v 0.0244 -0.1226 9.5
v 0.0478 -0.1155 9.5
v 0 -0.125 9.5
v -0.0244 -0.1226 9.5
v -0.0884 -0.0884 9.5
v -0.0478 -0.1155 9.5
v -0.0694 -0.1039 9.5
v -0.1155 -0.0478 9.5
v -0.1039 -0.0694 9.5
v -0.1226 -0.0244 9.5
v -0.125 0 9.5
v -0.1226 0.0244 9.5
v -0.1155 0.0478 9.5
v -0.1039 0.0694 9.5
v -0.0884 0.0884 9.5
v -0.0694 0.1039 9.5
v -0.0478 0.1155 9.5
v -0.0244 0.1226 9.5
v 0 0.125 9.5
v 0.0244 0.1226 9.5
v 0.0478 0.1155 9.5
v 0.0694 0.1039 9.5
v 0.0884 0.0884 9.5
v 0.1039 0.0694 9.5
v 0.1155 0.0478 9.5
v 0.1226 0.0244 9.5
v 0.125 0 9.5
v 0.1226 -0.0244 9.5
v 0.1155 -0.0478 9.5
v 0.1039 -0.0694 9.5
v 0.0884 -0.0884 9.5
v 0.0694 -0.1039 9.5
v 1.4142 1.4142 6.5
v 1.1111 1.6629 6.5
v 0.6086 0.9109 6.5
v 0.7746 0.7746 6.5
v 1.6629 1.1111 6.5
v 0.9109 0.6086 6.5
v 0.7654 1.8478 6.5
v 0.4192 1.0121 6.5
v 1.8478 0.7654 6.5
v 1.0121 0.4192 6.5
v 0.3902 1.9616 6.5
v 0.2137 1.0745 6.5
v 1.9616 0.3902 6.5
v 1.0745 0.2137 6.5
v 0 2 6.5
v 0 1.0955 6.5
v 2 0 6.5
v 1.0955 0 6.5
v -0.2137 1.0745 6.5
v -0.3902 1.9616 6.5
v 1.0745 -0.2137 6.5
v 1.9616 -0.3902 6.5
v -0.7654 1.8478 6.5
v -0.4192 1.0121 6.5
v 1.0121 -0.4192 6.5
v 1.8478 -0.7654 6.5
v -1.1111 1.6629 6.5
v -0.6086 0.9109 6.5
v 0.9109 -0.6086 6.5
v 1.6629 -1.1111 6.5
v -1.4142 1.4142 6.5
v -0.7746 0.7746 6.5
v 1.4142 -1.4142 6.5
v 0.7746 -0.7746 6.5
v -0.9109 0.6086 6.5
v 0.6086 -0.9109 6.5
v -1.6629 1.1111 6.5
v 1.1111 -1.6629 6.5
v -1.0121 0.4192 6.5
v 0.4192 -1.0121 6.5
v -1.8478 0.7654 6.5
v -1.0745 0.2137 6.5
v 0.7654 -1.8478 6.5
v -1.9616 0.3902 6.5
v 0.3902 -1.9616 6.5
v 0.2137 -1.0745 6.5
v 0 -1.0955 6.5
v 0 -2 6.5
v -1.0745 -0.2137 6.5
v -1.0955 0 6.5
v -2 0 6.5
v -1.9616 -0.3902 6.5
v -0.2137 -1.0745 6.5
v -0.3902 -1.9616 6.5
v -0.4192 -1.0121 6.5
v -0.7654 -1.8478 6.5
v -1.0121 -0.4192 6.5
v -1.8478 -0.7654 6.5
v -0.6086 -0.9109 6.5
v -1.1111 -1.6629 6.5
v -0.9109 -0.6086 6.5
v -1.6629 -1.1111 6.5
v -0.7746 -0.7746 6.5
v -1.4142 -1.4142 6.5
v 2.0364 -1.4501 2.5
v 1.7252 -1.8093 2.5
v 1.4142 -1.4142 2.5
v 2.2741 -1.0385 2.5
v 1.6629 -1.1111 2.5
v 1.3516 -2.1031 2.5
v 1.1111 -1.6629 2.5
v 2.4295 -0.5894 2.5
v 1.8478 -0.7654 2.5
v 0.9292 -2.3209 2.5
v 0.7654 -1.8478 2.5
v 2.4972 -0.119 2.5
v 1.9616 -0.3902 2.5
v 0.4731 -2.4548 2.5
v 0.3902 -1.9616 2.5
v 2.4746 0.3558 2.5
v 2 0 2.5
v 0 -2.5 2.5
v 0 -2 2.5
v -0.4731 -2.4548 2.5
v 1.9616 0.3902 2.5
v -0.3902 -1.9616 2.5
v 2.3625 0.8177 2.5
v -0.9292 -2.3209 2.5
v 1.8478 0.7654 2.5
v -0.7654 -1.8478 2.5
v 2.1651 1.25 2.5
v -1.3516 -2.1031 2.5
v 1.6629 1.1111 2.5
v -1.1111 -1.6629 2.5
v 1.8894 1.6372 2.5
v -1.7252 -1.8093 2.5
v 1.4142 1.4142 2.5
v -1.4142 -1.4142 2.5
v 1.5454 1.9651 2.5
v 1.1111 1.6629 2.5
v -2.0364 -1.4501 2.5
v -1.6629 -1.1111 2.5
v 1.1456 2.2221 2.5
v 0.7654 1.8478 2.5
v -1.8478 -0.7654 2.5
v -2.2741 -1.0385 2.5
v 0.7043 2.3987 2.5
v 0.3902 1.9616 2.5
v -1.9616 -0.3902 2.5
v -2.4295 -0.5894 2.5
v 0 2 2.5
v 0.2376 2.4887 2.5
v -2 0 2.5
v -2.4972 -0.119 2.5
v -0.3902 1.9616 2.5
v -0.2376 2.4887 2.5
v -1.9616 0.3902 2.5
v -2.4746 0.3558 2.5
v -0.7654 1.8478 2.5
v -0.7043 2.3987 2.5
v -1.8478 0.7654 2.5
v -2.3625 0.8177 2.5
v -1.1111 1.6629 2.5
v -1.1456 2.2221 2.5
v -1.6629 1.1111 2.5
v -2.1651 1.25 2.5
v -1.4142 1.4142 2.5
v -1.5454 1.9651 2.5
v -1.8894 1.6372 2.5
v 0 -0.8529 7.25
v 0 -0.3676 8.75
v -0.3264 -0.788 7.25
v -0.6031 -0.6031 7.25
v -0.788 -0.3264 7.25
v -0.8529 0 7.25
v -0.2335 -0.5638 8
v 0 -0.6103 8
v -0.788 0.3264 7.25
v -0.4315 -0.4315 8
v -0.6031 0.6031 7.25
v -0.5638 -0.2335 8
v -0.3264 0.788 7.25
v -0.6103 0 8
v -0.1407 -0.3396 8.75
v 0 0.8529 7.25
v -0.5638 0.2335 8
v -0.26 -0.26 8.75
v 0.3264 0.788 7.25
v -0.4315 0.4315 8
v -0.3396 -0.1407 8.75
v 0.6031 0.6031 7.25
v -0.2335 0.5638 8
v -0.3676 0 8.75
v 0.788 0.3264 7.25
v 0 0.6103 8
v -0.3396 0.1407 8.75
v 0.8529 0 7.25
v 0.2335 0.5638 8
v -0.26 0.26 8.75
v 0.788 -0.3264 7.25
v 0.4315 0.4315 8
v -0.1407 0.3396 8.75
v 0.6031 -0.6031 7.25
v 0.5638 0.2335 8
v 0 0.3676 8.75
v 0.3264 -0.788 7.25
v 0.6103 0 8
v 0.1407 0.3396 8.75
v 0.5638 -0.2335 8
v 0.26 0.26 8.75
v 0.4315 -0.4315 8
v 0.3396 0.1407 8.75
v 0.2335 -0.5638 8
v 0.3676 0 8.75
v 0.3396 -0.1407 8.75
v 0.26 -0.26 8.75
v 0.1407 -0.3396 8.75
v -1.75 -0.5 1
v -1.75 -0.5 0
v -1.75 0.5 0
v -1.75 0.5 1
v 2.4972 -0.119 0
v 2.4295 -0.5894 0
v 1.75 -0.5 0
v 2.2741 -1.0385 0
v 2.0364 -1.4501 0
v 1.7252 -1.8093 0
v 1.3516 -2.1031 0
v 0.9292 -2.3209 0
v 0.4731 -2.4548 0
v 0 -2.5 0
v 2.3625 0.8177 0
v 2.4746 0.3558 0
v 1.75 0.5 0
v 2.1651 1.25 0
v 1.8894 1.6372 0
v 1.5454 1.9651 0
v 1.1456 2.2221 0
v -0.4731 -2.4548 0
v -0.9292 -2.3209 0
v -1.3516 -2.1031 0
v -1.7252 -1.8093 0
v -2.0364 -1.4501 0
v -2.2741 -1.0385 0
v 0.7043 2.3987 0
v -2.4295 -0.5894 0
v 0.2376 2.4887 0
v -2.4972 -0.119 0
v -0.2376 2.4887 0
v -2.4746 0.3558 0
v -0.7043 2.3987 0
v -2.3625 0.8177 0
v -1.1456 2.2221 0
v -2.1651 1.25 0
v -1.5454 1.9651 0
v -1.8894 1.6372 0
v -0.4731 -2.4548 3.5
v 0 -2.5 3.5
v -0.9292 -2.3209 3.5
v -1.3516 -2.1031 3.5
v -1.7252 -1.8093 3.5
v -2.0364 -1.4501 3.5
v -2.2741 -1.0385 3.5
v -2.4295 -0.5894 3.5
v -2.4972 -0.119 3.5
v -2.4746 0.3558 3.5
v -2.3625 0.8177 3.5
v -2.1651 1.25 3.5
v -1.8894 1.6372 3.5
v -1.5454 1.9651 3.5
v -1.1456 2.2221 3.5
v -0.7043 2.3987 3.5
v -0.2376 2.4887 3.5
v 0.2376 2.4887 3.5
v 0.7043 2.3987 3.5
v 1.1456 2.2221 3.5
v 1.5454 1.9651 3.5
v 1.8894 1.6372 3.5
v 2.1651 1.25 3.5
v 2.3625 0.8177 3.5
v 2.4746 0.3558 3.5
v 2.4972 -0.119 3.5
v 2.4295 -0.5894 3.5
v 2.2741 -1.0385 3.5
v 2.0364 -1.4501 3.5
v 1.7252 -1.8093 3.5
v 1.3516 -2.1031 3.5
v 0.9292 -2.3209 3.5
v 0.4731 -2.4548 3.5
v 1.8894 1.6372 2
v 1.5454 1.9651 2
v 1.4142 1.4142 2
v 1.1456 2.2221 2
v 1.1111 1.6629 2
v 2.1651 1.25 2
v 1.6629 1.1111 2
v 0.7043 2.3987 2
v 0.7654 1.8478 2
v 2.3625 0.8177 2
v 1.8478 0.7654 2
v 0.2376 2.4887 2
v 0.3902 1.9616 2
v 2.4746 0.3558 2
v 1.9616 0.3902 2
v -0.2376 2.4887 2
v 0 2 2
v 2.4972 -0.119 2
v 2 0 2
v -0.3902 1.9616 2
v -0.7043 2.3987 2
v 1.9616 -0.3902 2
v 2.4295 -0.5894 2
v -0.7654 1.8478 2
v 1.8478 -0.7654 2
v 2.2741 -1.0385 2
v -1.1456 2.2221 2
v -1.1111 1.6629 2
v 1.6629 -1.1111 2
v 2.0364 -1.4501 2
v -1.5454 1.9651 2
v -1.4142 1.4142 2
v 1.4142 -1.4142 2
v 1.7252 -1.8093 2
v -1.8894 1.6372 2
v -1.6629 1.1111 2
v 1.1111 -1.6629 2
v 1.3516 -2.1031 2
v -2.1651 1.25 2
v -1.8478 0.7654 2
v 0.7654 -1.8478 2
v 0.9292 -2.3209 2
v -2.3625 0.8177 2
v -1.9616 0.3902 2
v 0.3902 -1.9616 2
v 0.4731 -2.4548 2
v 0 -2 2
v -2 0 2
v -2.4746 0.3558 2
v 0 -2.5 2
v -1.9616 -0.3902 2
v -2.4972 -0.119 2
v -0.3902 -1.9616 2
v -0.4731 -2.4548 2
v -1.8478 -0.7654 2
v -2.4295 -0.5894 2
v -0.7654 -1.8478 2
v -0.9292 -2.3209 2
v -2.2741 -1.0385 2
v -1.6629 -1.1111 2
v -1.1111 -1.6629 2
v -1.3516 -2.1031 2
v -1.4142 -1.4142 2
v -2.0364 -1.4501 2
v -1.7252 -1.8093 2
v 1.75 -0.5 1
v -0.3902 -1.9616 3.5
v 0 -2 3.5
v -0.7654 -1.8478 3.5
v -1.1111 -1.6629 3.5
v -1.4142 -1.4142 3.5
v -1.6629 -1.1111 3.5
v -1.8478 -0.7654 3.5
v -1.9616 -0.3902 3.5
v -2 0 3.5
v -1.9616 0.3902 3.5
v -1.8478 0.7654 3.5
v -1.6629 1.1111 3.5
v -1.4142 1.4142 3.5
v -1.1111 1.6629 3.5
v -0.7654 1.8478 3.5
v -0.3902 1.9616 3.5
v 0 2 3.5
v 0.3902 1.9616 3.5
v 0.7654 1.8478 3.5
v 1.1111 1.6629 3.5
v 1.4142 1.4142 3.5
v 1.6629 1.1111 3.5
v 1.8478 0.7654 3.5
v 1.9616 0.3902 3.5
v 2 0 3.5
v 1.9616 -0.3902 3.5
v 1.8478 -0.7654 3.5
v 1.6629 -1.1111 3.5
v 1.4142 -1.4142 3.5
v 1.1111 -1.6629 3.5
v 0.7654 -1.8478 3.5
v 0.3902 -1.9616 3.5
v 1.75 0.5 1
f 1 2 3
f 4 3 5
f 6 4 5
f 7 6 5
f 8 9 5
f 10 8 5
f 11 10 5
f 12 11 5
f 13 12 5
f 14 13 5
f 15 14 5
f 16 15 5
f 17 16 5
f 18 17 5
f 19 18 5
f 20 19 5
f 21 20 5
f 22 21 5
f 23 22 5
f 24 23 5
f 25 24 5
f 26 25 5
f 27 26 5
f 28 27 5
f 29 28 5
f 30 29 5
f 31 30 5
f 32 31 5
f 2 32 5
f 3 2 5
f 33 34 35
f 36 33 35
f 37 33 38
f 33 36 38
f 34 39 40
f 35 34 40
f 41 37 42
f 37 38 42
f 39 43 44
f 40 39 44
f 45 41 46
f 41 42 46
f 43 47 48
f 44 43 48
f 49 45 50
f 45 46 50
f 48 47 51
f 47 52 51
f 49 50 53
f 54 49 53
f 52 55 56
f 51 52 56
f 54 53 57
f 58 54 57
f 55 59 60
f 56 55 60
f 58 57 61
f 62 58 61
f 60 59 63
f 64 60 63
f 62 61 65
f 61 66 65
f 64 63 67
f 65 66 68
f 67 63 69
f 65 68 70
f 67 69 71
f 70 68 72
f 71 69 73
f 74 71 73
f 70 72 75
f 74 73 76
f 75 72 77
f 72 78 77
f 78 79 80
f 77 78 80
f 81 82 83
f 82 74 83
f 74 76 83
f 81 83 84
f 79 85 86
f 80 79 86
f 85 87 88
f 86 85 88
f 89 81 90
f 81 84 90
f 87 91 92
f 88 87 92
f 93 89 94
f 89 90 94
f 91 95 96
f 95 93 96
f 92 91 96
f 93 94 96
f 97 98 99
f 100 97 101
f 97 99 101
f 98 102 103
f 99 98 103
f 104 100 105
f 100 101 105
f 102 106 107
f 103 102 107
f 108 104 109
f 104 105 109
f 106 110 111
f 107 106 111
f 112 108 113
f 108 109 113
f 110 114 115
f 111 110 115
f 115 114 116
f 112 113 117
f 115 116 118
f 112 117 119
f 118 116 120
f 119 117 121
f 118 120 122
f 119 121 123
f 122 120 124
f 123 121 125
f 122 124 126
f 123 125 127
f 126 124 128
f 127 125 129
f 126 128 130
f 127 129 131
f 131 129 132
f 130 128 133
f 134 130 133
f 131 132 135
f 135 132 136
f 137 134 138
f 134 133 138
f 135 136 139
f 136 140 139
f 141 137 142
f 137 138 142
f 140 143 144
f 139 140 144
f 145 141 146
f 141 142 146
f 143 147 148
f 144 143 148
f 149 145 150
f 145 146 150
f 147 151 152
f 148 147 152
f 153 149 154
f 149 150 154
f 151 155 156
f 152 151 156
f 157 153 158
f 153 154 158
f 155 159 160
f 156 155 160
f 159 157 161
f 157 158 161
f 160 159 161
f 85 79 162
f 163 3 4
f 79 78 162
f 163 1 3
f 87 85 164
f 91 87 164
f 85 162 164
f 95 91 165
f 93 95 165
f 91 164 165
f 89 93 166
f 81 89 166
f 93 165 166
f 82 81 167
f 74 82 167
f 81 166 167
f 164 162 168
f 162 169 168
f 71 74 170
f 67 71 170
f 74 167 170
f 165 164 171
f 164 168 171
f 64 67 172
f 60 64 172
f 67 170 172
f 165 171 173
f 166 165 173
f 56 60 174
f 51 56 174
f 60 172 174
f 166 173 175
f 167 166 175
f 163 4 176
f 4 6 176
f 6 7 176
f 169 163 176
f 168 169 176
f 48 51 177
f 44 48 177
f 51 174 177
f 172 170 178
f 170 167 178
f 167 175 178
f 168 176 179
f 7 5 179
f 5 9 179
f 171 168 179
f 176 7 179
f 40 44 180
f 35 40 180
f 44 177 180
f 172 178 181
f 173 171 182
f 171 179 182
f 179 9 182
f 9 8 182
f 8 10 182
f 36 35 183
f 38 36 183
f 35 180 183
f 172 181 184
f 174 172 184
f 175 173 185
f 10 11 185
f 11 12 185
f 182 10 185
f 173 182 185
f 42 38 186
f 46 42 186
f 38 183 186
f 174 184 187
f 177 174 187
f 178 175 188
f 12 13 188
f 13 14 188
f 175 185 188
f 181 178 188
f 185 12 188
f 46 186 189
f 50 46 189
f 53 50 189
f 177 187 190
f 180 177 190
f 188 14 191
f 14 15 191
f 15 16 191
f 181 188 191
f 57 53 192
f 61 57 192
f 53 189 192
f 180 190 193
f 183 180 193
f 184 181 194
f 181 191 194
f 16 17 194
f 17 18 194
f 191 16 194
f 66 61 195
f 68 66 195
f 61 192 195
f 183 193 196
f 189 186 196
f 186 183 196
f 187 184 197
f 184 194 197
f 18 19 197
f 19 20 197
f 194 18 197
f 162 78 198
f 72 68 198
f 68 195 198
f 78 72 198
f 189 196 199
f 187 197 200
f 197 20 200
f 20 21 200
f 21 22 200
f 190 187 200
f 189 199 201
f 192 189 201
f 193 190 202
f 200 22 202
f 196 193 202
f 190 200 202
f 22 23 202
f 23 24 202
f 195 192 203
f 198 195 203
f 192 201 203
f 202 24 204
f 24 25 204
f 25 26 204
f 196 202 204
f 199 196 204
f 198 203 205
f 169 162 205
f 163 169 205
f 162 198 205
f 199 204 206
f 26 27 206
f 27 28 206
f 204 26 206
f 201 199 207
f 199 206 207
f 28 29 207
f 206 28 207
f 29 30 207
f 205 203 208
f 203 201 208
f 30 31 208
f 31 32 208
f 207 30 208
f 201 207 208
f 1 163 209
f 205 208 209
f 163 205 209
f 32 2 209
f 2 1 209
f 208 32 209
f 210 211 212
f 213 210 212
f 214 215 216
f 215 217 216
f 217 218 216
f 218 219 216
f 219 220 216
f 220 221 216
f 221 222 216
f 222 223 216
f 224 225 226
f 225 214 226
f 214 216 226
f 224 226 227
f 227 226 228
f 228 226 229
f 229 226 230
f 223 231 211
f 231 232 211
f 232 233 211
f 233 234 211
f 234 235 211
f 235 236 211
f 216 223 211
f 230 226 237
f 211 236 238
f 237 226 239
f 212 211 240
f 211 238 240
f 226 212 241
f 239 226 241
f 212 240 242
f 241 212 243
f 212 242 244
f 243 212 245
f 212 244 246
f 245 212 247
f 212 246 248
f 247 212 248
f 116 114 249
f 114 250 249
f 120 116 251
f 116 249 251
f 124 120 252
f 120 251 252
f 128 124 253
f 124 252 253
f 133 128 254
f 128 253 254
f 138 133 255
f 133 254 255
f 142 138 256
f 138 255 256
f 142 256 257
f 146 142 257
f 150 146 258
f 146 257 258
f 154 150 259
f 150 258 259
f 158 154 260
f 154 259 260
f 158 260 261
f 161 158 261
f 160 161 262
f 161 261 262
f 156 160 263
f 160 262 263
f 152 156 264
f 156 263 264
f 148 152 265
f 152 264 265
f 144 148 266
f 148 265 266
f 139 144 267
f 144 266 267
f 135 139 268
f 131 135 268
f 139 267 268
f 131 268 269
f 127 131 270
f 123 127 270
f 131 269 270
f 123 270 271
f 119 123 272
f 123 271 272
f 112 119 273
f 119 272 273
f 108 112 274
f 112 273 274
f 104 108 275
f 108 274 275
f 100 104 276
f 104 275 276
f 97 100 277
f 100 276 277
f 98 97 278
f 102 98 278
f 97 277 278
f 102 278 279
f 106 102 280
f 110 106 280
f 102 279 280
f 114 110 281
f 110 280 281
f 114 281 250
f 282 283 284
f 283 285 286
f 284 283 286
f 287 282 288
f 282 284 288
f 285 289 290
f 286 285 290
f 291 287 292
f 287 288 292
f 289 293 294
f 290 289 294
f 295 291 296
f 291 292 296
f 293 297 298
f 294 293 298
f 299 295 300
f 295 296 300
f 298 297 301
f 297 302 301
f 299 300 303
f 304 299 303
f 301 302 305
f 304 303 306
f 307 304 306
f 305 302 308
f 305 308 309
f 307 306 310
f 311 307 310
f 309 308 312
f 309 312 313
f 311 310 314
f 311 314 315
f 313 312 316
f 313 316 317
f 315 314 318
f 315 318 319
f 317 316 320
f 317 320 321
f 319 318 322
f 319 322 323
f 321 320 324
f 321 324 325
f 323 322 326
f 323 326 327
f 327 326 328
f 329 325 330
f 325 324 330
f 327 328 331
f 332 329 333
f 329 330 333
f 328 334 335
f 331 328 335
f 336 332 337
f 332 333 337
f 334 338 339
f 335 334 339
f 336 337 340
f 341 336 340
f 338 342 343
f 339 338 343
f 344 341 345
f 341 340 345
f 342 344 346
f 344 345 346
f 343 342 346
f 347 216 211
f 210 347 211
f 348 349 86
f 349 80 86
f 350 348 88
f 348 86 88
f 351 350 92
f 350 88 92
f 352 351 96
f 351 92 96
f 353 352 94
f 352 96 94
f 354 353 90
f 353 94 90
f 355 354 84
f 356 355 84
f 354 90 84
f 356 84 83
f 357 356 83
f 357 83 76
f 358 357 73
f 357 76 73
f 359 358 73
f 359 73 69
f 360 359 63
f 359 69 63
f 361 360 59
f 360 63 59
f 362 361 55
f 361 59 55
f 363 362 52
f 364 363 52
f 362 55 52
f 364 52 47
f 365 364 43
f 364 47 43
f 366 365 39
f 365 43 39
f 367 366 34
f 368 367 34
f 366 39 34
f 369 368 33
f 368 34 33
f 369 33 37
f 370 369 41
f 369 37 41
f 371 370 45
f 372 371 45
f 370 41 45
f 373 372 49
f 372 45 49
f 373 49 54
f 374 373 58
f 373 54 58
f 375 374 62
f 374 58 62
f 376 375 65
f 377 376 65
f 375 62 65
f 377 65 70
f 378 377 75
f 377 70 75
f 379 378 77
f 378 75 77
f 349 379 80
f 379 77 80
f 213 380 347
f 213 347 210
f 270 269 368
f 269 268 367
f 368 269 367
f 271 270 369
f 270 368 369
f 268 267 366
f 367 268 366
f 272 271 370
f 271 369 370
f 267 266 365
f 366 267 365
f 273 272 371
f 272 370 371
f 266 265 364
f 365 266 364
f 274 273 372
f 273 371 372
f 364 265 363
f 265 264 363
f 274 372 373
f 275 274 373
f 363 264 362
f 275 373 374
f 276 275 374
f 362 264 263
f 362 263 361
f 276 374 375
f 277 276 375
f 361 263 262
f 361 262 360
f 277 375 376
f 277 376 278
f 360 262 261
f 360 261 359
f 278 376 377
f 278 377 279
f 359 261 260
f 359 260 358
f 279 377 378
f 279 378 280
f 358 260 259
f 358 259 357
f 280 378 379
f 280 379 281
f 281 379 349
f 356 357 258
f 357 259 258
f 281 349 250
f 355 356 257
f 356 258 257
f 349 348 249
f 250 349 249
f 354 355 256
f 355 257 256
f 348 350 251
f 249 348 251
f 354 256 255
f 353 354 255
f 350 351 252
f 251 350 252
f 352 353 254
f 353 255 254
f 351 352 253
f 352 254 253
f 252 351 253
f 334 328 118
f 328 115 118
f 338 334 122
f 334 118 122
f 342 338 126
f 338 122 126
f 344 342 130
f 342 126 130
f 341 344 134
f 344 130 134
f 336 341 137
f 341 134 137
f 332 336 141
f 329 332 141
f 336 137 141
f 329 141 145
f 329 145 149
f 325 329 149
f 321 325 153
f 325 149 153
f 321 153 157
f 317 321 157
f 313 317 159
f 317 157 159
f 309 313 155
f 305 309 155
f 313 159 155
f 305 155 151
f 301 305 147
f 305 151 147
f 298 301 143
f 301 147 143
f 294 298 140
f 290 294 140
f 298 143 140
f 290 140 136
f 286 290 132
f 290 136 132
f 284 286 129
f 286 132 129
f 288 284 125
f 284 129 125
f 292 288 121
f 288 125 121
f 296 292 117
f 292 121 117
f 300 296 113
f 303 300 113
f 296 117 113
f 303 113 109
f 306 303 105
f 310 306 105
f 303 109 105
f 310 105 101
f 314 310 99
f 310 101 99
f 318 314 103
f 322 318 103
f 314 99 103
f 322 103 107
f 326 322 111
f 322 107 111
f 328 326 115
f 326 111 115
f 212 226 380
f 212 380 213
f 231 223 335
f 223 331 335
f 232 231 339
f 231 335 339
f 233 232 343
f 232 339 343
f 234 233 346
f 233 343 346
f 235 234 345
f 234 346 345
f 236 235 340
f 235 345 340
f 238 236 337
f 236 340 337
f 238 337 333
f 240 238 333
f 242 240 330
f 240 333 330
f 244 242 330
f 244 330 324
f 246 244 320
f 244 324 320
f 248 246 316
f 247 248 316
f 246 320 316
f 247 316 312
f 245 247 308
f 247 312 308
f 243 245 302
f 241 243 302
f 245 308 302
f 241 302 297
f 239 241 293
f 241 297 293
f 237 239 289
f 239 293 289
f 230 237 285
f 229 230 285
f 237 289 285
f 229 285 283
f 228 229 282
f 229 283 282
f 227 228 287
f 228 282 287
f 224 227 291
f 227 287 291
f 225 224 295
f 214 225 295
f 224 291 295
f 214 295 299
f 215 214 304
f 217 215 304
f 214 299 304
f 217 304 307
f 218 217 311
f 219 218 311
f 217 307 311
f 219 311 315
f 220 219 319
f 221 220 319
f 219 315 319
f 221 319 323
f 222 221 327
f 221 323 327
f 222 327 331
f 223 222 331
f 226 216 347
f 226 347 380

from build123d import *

# Parameters (mm, degrees)
CROQUIS4_W            = 3.5
CROQUIS4_H            = 1
CORTAR_EXTRUIR1_DEPTH = 1


with BuildPart() as part:
    # Croquis3 → Revolución1 (revolve)
    with BuildSketch(Plane(origin=(0, 0, 0), x_dir=(0, 0, -1), z_dir=(1, 0, 0)), mode=Mode.PRIVATE) as revoluci_n1_sk:
        Polygon((0, 0), (0, 2.5), (-2, 2.5), (-2, 2), (-2.5, 2), (-2.5, 2.5), (-3.5, 2.5), (-3.5, 2), (-6.5, 2), (-6.5, 1.095516127), (-9.5, 0.125), (-9.5, 0), align=None)
    revolve(revoluci_n1_sk.sketch.rotate(Axis((0, 0, 9.5), (0, 0, -1)), 180), axis=Axis((0, 0, 9.5), (0, 0, -1)))

    # Croquis4 → Cortar-Extruir1 (cut)
    with BuildSketch(Plane(origin=(0, 0, 0), x_dir=(-1, 0, 0), z_dir=(0, 0, -1))):
        Rectangle(CROQUIS4_W, CROQUIS4_H)
    extrude(amount=-CORTAR_EXTRUIR1_DEPTH, mode=Mode.SUBTRACT)


solid = part.part
